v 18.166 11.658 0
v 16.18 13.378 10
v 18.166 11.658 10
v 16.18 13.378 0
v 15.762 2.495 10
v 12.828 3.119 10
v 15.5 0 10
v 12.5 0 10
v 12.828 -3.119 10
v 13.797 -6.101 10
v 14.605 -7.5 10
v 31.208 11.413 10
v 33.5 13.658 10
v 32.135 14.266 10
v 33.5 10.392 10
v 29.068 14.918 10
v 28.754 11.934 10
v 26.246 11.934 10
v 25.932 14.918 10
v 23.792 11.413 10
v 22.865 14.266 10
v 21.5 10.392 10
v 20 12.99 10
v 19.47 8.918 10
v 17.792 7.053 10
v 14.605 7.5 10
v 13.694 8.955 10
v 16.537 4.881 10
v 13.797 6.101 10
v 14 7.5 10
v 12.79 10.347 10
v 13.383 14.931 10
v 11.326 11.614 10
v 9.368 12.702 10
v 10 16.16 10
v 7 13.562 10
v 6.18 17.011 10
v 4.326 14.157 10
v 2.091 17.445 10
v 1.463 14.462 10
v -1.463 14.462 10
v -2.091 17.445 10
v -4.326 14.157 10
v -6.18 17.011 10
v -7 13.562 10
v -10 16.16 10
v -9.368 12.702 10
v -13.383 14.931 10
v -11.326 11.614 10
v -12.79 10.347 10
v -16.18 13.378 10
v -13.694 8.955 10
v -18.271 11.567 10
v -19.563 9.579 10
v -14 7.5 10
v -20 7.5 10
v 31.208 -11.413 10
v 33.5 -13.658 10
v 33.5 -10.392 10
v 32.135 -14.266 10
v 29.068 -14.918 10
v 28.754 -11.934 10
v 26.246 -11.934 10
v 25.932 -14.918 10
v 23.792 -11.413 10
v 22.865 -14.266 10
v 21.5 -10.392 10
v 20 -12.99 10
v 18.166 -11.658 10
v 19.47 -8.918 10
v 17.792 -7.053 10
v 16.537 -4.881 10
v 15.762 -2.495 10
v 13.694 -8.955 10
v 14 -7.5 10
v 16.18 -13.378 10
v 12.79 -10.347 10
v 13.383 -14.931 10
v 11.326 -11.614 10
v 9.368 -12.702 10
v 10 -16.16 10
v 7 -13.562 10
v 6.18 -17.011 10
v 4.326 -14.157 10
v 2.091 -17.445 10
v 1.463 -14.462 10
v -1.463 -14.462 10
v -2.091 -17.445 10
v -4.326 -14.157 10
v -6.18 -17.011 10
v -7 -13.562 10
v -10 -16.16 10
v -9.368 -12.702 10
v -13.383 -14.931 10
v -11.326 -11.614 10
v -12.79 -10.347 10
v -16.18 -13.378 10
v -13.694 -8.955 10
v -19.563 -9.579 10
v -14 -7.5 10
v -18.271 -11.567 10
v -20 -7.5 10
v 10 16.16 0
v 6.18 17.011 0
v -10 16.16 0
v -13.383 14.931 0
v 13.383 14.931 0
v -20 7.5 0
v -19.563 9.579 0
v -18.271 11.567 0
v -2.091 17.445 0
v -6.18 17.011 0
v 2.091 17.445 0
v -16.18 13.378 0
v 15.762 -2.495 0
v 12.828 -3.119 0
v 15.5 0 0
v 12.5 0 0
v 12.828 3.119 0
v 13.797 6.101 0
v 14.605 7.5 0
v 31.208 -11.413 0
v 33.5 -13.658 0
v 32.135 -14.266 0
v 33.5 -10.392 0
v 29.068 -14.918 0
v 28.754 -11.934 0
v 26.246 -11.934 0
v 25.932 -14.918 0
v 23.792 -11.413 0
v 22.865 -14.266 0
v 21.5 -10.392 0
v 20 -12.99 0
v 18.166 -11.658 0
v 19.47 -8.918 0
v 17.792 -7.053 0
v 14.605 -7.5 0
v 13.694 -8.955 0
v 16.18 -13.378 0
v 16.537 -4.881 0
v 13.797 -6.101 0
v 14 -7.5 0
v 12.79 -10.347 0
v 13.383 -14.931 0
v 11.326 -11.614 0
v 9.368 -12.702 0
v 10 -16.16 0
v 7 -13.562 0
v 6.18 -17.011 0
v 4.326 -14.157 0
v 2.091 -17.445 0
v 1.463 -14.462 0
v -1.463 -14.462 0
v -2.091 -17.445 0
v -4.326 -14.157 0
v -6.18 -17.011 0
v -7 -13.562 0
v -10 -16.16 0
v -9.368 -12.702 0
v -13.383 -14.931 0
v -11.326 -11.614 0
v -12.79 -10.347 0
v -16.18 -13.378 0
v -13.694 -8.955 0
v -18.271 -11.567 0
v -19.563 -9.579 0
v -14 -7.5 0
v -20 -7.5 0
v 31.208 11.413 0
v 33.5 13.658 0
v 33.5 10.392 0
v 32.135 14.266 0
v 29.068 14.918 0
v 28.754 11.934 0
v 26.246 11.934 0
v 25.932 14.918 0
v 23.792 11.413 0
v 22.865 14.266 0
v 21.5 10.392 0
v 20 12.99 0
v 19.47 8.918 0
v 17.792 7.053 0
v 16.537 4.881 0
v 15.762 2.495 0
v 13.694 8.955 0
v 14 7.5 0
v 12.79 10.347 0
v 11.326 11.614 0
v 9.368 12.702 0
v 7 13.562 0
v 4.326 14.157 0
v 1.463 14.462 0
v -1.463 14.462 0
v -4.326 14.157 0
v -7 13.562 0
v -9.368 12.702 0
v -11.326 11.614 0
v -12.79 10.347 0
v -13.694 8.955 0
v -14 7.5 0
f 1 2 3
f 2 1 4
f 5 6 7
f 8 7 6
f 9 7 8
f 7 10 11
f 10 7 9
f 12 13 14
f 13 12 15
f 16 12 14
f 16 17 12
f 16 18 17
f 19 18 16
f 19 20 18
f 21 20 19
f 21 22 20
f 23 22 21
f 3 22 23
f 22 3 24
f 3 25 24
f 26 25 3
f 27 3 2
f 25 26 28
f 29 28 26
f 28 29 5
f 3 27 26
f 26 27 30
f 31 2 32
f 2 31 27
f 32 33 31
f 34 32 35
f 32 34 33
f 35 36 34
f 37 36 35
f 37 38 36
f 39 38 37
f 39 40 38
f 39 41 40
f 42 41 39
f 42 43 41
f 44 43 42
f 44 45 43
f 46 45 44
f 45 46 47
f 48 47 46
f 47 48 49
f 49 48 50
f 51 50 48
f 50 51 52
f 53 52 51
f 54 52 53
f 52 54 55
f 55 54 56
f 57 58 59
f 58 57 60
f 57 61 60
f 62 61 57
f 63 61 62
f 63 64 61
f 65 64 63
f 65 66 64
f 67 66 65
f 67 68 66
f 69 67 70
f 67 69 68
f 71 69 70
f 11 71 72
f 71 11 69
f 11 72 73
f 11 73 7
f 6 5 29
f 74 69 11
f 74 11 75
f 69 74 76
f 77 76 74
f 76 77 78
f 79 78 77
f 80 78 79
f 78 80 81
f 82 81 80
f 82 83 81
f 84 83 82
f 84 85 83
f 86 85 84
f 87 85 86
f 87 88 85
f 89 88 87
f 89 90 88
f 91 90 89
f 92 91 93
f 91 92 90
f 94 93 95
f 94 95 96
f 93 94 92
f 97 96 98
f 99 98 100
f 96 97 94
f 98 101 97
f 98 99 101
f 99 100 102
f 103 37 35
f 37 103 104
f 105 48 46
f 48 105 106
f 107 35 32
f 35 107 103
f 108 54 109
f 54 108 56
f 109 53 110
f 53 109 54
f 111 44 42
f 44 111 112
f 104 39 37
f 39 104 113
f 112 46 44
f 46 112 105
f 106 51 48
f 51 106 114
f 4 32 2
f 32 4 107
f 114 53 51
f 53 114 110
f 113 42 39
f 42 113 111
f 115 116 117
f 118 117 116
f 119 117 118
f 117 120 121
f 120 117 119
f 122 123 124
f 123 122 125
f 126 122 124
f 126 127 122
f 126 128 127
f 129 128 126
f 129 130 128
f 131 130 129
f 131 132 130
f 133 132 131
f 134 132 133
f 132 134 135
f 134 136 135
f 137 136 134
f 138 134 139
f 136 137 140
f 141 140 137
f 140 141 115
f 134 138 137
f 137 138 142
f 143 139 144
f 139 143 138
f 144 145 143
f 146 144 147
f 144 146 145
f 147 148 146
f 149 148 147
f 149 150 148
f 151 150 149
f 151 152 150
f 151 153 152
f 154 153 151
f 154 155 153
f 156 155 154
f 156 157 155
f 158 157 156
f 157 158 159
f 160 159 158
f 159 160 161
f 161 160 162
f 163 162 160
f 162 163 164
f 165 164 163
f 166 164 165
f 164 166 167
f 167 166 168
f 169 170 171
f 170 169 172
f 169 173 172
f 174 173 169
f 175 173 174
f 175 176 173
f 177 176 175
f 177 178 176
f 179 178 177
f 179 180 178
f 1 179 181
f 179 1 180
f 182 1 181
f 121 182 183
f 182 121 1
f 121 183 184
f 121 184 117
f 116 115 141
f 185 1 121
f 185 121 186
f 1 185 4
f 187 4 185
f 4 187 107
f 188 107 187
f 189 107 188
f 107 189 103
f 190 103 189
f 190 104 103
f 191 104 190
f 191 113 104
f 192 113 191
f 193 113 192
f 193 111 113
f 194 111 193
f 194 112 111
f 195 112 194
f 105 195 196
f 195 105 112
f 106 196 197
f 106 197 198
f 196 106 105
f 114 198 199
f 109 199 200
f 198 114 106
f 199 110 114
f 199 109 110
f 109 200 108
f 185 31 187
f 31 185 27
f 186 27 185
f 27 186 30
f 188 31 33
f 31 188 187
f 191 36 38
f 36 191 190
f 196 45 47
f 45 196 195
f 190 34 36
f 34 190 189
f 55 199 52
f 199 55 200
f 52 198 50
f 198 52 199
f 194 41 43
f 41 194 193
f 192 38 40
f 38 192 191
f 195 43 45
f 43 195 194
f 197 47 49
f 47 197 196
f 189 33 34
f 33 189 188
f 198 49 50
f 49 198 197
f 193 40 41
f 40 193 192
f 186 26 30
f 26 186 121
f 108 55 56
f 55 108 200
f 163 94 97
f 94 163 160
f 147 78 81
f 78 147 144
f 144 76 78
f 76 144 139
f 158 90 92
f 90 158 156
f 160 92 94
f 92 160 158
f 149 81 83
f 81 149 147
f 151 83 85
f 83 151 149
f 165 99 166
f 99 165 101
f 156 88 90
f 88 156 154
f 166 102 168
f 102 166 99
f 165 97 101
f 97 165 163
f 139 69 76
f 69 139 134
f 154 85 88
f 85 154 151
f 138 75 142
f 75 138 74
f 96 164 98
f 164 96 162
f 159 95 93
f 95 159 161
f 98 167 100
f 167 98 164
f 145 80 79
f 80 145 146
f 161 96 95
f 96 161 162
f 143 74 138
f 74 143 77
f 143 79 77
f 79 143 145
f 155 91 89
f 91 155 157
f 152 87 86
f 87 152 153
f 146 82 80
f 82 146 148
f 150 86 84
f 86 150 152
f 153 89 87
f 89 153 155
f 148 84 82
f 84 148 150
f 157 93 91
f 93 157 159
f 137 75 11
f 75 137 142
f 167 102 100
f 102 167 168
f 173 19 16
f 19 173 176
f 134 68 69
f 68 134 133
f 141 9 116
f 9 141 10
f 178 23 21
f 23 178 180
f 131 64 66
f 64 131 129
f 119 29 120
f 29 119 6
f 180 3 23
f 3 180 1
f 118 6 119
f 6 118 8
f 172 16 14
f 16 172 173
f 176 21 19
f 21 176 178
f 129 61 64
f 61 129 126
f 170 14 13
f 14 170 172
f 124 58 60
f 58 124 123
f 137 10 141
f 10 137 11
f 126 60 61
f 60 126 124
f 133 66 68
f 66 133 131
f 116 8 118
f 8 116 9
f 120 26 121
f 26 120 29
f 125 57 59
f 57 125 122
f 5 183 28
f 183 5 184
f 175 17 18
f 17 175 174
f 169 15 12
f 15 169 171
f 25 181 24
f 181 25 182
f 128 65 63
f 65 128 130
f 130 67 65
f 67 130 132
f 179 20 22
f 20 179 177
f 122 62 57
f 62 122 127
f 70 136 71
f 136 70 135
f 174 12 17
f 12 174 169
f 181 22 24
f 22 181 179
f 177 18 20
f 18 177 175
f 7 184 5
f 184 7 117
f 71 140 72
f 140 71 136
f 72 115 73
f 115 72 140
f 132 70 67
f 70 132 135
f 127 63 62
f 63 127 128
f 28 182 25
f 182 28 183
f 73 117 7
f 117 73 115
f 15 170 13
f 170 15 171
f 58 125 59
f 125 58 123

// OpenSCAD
BendRaduis=20;
height=10;
thickness=3;
Gap=15;

module TopJaw(){
	scale([1,.5,1])difference(){
		cylinder(r=BendRaduis,h=height);
		cylinder(r=BendRaduis-thickness*2,h=height);
		translate([-BendRaduis,0,-height])cube([BendRaduis*3,BendRaduis*3,height*3]);
	}
}
module BottomJaw(){
	difference(){
		scale([1,.5,1])cylinder(r=BendRaduis,h=height);
		scale([1,.5,1])cylinder(r=BendRaduis-thickness*2,h=height);
		translate([-BendRaduis,-BendRaduis*3,-height])cube([BendRaduis*3,BendRaduis*3,height*3]);
	}
}
module clip(){
	difference(){
		union(){
			translate([0,Gap/2,0])BottomJaw();
			translate([0,-Gap/2,0])TopJaw();
			translate([BendRaduis+Gap/2,0,0])cylinder(r=.75*BendRaduis,h=height);
		}
			
		translate([BendRaduis+Gap/2,0,0])cylinder(r=.75*BendRaduis-thickness,h=height);
		translate([1.3*BendRaduis+Gap/2,-BendRaduis*2,-height])cube([BendRaduis*4,BendRaduis*4,height*3]);

	}
}
clip();
